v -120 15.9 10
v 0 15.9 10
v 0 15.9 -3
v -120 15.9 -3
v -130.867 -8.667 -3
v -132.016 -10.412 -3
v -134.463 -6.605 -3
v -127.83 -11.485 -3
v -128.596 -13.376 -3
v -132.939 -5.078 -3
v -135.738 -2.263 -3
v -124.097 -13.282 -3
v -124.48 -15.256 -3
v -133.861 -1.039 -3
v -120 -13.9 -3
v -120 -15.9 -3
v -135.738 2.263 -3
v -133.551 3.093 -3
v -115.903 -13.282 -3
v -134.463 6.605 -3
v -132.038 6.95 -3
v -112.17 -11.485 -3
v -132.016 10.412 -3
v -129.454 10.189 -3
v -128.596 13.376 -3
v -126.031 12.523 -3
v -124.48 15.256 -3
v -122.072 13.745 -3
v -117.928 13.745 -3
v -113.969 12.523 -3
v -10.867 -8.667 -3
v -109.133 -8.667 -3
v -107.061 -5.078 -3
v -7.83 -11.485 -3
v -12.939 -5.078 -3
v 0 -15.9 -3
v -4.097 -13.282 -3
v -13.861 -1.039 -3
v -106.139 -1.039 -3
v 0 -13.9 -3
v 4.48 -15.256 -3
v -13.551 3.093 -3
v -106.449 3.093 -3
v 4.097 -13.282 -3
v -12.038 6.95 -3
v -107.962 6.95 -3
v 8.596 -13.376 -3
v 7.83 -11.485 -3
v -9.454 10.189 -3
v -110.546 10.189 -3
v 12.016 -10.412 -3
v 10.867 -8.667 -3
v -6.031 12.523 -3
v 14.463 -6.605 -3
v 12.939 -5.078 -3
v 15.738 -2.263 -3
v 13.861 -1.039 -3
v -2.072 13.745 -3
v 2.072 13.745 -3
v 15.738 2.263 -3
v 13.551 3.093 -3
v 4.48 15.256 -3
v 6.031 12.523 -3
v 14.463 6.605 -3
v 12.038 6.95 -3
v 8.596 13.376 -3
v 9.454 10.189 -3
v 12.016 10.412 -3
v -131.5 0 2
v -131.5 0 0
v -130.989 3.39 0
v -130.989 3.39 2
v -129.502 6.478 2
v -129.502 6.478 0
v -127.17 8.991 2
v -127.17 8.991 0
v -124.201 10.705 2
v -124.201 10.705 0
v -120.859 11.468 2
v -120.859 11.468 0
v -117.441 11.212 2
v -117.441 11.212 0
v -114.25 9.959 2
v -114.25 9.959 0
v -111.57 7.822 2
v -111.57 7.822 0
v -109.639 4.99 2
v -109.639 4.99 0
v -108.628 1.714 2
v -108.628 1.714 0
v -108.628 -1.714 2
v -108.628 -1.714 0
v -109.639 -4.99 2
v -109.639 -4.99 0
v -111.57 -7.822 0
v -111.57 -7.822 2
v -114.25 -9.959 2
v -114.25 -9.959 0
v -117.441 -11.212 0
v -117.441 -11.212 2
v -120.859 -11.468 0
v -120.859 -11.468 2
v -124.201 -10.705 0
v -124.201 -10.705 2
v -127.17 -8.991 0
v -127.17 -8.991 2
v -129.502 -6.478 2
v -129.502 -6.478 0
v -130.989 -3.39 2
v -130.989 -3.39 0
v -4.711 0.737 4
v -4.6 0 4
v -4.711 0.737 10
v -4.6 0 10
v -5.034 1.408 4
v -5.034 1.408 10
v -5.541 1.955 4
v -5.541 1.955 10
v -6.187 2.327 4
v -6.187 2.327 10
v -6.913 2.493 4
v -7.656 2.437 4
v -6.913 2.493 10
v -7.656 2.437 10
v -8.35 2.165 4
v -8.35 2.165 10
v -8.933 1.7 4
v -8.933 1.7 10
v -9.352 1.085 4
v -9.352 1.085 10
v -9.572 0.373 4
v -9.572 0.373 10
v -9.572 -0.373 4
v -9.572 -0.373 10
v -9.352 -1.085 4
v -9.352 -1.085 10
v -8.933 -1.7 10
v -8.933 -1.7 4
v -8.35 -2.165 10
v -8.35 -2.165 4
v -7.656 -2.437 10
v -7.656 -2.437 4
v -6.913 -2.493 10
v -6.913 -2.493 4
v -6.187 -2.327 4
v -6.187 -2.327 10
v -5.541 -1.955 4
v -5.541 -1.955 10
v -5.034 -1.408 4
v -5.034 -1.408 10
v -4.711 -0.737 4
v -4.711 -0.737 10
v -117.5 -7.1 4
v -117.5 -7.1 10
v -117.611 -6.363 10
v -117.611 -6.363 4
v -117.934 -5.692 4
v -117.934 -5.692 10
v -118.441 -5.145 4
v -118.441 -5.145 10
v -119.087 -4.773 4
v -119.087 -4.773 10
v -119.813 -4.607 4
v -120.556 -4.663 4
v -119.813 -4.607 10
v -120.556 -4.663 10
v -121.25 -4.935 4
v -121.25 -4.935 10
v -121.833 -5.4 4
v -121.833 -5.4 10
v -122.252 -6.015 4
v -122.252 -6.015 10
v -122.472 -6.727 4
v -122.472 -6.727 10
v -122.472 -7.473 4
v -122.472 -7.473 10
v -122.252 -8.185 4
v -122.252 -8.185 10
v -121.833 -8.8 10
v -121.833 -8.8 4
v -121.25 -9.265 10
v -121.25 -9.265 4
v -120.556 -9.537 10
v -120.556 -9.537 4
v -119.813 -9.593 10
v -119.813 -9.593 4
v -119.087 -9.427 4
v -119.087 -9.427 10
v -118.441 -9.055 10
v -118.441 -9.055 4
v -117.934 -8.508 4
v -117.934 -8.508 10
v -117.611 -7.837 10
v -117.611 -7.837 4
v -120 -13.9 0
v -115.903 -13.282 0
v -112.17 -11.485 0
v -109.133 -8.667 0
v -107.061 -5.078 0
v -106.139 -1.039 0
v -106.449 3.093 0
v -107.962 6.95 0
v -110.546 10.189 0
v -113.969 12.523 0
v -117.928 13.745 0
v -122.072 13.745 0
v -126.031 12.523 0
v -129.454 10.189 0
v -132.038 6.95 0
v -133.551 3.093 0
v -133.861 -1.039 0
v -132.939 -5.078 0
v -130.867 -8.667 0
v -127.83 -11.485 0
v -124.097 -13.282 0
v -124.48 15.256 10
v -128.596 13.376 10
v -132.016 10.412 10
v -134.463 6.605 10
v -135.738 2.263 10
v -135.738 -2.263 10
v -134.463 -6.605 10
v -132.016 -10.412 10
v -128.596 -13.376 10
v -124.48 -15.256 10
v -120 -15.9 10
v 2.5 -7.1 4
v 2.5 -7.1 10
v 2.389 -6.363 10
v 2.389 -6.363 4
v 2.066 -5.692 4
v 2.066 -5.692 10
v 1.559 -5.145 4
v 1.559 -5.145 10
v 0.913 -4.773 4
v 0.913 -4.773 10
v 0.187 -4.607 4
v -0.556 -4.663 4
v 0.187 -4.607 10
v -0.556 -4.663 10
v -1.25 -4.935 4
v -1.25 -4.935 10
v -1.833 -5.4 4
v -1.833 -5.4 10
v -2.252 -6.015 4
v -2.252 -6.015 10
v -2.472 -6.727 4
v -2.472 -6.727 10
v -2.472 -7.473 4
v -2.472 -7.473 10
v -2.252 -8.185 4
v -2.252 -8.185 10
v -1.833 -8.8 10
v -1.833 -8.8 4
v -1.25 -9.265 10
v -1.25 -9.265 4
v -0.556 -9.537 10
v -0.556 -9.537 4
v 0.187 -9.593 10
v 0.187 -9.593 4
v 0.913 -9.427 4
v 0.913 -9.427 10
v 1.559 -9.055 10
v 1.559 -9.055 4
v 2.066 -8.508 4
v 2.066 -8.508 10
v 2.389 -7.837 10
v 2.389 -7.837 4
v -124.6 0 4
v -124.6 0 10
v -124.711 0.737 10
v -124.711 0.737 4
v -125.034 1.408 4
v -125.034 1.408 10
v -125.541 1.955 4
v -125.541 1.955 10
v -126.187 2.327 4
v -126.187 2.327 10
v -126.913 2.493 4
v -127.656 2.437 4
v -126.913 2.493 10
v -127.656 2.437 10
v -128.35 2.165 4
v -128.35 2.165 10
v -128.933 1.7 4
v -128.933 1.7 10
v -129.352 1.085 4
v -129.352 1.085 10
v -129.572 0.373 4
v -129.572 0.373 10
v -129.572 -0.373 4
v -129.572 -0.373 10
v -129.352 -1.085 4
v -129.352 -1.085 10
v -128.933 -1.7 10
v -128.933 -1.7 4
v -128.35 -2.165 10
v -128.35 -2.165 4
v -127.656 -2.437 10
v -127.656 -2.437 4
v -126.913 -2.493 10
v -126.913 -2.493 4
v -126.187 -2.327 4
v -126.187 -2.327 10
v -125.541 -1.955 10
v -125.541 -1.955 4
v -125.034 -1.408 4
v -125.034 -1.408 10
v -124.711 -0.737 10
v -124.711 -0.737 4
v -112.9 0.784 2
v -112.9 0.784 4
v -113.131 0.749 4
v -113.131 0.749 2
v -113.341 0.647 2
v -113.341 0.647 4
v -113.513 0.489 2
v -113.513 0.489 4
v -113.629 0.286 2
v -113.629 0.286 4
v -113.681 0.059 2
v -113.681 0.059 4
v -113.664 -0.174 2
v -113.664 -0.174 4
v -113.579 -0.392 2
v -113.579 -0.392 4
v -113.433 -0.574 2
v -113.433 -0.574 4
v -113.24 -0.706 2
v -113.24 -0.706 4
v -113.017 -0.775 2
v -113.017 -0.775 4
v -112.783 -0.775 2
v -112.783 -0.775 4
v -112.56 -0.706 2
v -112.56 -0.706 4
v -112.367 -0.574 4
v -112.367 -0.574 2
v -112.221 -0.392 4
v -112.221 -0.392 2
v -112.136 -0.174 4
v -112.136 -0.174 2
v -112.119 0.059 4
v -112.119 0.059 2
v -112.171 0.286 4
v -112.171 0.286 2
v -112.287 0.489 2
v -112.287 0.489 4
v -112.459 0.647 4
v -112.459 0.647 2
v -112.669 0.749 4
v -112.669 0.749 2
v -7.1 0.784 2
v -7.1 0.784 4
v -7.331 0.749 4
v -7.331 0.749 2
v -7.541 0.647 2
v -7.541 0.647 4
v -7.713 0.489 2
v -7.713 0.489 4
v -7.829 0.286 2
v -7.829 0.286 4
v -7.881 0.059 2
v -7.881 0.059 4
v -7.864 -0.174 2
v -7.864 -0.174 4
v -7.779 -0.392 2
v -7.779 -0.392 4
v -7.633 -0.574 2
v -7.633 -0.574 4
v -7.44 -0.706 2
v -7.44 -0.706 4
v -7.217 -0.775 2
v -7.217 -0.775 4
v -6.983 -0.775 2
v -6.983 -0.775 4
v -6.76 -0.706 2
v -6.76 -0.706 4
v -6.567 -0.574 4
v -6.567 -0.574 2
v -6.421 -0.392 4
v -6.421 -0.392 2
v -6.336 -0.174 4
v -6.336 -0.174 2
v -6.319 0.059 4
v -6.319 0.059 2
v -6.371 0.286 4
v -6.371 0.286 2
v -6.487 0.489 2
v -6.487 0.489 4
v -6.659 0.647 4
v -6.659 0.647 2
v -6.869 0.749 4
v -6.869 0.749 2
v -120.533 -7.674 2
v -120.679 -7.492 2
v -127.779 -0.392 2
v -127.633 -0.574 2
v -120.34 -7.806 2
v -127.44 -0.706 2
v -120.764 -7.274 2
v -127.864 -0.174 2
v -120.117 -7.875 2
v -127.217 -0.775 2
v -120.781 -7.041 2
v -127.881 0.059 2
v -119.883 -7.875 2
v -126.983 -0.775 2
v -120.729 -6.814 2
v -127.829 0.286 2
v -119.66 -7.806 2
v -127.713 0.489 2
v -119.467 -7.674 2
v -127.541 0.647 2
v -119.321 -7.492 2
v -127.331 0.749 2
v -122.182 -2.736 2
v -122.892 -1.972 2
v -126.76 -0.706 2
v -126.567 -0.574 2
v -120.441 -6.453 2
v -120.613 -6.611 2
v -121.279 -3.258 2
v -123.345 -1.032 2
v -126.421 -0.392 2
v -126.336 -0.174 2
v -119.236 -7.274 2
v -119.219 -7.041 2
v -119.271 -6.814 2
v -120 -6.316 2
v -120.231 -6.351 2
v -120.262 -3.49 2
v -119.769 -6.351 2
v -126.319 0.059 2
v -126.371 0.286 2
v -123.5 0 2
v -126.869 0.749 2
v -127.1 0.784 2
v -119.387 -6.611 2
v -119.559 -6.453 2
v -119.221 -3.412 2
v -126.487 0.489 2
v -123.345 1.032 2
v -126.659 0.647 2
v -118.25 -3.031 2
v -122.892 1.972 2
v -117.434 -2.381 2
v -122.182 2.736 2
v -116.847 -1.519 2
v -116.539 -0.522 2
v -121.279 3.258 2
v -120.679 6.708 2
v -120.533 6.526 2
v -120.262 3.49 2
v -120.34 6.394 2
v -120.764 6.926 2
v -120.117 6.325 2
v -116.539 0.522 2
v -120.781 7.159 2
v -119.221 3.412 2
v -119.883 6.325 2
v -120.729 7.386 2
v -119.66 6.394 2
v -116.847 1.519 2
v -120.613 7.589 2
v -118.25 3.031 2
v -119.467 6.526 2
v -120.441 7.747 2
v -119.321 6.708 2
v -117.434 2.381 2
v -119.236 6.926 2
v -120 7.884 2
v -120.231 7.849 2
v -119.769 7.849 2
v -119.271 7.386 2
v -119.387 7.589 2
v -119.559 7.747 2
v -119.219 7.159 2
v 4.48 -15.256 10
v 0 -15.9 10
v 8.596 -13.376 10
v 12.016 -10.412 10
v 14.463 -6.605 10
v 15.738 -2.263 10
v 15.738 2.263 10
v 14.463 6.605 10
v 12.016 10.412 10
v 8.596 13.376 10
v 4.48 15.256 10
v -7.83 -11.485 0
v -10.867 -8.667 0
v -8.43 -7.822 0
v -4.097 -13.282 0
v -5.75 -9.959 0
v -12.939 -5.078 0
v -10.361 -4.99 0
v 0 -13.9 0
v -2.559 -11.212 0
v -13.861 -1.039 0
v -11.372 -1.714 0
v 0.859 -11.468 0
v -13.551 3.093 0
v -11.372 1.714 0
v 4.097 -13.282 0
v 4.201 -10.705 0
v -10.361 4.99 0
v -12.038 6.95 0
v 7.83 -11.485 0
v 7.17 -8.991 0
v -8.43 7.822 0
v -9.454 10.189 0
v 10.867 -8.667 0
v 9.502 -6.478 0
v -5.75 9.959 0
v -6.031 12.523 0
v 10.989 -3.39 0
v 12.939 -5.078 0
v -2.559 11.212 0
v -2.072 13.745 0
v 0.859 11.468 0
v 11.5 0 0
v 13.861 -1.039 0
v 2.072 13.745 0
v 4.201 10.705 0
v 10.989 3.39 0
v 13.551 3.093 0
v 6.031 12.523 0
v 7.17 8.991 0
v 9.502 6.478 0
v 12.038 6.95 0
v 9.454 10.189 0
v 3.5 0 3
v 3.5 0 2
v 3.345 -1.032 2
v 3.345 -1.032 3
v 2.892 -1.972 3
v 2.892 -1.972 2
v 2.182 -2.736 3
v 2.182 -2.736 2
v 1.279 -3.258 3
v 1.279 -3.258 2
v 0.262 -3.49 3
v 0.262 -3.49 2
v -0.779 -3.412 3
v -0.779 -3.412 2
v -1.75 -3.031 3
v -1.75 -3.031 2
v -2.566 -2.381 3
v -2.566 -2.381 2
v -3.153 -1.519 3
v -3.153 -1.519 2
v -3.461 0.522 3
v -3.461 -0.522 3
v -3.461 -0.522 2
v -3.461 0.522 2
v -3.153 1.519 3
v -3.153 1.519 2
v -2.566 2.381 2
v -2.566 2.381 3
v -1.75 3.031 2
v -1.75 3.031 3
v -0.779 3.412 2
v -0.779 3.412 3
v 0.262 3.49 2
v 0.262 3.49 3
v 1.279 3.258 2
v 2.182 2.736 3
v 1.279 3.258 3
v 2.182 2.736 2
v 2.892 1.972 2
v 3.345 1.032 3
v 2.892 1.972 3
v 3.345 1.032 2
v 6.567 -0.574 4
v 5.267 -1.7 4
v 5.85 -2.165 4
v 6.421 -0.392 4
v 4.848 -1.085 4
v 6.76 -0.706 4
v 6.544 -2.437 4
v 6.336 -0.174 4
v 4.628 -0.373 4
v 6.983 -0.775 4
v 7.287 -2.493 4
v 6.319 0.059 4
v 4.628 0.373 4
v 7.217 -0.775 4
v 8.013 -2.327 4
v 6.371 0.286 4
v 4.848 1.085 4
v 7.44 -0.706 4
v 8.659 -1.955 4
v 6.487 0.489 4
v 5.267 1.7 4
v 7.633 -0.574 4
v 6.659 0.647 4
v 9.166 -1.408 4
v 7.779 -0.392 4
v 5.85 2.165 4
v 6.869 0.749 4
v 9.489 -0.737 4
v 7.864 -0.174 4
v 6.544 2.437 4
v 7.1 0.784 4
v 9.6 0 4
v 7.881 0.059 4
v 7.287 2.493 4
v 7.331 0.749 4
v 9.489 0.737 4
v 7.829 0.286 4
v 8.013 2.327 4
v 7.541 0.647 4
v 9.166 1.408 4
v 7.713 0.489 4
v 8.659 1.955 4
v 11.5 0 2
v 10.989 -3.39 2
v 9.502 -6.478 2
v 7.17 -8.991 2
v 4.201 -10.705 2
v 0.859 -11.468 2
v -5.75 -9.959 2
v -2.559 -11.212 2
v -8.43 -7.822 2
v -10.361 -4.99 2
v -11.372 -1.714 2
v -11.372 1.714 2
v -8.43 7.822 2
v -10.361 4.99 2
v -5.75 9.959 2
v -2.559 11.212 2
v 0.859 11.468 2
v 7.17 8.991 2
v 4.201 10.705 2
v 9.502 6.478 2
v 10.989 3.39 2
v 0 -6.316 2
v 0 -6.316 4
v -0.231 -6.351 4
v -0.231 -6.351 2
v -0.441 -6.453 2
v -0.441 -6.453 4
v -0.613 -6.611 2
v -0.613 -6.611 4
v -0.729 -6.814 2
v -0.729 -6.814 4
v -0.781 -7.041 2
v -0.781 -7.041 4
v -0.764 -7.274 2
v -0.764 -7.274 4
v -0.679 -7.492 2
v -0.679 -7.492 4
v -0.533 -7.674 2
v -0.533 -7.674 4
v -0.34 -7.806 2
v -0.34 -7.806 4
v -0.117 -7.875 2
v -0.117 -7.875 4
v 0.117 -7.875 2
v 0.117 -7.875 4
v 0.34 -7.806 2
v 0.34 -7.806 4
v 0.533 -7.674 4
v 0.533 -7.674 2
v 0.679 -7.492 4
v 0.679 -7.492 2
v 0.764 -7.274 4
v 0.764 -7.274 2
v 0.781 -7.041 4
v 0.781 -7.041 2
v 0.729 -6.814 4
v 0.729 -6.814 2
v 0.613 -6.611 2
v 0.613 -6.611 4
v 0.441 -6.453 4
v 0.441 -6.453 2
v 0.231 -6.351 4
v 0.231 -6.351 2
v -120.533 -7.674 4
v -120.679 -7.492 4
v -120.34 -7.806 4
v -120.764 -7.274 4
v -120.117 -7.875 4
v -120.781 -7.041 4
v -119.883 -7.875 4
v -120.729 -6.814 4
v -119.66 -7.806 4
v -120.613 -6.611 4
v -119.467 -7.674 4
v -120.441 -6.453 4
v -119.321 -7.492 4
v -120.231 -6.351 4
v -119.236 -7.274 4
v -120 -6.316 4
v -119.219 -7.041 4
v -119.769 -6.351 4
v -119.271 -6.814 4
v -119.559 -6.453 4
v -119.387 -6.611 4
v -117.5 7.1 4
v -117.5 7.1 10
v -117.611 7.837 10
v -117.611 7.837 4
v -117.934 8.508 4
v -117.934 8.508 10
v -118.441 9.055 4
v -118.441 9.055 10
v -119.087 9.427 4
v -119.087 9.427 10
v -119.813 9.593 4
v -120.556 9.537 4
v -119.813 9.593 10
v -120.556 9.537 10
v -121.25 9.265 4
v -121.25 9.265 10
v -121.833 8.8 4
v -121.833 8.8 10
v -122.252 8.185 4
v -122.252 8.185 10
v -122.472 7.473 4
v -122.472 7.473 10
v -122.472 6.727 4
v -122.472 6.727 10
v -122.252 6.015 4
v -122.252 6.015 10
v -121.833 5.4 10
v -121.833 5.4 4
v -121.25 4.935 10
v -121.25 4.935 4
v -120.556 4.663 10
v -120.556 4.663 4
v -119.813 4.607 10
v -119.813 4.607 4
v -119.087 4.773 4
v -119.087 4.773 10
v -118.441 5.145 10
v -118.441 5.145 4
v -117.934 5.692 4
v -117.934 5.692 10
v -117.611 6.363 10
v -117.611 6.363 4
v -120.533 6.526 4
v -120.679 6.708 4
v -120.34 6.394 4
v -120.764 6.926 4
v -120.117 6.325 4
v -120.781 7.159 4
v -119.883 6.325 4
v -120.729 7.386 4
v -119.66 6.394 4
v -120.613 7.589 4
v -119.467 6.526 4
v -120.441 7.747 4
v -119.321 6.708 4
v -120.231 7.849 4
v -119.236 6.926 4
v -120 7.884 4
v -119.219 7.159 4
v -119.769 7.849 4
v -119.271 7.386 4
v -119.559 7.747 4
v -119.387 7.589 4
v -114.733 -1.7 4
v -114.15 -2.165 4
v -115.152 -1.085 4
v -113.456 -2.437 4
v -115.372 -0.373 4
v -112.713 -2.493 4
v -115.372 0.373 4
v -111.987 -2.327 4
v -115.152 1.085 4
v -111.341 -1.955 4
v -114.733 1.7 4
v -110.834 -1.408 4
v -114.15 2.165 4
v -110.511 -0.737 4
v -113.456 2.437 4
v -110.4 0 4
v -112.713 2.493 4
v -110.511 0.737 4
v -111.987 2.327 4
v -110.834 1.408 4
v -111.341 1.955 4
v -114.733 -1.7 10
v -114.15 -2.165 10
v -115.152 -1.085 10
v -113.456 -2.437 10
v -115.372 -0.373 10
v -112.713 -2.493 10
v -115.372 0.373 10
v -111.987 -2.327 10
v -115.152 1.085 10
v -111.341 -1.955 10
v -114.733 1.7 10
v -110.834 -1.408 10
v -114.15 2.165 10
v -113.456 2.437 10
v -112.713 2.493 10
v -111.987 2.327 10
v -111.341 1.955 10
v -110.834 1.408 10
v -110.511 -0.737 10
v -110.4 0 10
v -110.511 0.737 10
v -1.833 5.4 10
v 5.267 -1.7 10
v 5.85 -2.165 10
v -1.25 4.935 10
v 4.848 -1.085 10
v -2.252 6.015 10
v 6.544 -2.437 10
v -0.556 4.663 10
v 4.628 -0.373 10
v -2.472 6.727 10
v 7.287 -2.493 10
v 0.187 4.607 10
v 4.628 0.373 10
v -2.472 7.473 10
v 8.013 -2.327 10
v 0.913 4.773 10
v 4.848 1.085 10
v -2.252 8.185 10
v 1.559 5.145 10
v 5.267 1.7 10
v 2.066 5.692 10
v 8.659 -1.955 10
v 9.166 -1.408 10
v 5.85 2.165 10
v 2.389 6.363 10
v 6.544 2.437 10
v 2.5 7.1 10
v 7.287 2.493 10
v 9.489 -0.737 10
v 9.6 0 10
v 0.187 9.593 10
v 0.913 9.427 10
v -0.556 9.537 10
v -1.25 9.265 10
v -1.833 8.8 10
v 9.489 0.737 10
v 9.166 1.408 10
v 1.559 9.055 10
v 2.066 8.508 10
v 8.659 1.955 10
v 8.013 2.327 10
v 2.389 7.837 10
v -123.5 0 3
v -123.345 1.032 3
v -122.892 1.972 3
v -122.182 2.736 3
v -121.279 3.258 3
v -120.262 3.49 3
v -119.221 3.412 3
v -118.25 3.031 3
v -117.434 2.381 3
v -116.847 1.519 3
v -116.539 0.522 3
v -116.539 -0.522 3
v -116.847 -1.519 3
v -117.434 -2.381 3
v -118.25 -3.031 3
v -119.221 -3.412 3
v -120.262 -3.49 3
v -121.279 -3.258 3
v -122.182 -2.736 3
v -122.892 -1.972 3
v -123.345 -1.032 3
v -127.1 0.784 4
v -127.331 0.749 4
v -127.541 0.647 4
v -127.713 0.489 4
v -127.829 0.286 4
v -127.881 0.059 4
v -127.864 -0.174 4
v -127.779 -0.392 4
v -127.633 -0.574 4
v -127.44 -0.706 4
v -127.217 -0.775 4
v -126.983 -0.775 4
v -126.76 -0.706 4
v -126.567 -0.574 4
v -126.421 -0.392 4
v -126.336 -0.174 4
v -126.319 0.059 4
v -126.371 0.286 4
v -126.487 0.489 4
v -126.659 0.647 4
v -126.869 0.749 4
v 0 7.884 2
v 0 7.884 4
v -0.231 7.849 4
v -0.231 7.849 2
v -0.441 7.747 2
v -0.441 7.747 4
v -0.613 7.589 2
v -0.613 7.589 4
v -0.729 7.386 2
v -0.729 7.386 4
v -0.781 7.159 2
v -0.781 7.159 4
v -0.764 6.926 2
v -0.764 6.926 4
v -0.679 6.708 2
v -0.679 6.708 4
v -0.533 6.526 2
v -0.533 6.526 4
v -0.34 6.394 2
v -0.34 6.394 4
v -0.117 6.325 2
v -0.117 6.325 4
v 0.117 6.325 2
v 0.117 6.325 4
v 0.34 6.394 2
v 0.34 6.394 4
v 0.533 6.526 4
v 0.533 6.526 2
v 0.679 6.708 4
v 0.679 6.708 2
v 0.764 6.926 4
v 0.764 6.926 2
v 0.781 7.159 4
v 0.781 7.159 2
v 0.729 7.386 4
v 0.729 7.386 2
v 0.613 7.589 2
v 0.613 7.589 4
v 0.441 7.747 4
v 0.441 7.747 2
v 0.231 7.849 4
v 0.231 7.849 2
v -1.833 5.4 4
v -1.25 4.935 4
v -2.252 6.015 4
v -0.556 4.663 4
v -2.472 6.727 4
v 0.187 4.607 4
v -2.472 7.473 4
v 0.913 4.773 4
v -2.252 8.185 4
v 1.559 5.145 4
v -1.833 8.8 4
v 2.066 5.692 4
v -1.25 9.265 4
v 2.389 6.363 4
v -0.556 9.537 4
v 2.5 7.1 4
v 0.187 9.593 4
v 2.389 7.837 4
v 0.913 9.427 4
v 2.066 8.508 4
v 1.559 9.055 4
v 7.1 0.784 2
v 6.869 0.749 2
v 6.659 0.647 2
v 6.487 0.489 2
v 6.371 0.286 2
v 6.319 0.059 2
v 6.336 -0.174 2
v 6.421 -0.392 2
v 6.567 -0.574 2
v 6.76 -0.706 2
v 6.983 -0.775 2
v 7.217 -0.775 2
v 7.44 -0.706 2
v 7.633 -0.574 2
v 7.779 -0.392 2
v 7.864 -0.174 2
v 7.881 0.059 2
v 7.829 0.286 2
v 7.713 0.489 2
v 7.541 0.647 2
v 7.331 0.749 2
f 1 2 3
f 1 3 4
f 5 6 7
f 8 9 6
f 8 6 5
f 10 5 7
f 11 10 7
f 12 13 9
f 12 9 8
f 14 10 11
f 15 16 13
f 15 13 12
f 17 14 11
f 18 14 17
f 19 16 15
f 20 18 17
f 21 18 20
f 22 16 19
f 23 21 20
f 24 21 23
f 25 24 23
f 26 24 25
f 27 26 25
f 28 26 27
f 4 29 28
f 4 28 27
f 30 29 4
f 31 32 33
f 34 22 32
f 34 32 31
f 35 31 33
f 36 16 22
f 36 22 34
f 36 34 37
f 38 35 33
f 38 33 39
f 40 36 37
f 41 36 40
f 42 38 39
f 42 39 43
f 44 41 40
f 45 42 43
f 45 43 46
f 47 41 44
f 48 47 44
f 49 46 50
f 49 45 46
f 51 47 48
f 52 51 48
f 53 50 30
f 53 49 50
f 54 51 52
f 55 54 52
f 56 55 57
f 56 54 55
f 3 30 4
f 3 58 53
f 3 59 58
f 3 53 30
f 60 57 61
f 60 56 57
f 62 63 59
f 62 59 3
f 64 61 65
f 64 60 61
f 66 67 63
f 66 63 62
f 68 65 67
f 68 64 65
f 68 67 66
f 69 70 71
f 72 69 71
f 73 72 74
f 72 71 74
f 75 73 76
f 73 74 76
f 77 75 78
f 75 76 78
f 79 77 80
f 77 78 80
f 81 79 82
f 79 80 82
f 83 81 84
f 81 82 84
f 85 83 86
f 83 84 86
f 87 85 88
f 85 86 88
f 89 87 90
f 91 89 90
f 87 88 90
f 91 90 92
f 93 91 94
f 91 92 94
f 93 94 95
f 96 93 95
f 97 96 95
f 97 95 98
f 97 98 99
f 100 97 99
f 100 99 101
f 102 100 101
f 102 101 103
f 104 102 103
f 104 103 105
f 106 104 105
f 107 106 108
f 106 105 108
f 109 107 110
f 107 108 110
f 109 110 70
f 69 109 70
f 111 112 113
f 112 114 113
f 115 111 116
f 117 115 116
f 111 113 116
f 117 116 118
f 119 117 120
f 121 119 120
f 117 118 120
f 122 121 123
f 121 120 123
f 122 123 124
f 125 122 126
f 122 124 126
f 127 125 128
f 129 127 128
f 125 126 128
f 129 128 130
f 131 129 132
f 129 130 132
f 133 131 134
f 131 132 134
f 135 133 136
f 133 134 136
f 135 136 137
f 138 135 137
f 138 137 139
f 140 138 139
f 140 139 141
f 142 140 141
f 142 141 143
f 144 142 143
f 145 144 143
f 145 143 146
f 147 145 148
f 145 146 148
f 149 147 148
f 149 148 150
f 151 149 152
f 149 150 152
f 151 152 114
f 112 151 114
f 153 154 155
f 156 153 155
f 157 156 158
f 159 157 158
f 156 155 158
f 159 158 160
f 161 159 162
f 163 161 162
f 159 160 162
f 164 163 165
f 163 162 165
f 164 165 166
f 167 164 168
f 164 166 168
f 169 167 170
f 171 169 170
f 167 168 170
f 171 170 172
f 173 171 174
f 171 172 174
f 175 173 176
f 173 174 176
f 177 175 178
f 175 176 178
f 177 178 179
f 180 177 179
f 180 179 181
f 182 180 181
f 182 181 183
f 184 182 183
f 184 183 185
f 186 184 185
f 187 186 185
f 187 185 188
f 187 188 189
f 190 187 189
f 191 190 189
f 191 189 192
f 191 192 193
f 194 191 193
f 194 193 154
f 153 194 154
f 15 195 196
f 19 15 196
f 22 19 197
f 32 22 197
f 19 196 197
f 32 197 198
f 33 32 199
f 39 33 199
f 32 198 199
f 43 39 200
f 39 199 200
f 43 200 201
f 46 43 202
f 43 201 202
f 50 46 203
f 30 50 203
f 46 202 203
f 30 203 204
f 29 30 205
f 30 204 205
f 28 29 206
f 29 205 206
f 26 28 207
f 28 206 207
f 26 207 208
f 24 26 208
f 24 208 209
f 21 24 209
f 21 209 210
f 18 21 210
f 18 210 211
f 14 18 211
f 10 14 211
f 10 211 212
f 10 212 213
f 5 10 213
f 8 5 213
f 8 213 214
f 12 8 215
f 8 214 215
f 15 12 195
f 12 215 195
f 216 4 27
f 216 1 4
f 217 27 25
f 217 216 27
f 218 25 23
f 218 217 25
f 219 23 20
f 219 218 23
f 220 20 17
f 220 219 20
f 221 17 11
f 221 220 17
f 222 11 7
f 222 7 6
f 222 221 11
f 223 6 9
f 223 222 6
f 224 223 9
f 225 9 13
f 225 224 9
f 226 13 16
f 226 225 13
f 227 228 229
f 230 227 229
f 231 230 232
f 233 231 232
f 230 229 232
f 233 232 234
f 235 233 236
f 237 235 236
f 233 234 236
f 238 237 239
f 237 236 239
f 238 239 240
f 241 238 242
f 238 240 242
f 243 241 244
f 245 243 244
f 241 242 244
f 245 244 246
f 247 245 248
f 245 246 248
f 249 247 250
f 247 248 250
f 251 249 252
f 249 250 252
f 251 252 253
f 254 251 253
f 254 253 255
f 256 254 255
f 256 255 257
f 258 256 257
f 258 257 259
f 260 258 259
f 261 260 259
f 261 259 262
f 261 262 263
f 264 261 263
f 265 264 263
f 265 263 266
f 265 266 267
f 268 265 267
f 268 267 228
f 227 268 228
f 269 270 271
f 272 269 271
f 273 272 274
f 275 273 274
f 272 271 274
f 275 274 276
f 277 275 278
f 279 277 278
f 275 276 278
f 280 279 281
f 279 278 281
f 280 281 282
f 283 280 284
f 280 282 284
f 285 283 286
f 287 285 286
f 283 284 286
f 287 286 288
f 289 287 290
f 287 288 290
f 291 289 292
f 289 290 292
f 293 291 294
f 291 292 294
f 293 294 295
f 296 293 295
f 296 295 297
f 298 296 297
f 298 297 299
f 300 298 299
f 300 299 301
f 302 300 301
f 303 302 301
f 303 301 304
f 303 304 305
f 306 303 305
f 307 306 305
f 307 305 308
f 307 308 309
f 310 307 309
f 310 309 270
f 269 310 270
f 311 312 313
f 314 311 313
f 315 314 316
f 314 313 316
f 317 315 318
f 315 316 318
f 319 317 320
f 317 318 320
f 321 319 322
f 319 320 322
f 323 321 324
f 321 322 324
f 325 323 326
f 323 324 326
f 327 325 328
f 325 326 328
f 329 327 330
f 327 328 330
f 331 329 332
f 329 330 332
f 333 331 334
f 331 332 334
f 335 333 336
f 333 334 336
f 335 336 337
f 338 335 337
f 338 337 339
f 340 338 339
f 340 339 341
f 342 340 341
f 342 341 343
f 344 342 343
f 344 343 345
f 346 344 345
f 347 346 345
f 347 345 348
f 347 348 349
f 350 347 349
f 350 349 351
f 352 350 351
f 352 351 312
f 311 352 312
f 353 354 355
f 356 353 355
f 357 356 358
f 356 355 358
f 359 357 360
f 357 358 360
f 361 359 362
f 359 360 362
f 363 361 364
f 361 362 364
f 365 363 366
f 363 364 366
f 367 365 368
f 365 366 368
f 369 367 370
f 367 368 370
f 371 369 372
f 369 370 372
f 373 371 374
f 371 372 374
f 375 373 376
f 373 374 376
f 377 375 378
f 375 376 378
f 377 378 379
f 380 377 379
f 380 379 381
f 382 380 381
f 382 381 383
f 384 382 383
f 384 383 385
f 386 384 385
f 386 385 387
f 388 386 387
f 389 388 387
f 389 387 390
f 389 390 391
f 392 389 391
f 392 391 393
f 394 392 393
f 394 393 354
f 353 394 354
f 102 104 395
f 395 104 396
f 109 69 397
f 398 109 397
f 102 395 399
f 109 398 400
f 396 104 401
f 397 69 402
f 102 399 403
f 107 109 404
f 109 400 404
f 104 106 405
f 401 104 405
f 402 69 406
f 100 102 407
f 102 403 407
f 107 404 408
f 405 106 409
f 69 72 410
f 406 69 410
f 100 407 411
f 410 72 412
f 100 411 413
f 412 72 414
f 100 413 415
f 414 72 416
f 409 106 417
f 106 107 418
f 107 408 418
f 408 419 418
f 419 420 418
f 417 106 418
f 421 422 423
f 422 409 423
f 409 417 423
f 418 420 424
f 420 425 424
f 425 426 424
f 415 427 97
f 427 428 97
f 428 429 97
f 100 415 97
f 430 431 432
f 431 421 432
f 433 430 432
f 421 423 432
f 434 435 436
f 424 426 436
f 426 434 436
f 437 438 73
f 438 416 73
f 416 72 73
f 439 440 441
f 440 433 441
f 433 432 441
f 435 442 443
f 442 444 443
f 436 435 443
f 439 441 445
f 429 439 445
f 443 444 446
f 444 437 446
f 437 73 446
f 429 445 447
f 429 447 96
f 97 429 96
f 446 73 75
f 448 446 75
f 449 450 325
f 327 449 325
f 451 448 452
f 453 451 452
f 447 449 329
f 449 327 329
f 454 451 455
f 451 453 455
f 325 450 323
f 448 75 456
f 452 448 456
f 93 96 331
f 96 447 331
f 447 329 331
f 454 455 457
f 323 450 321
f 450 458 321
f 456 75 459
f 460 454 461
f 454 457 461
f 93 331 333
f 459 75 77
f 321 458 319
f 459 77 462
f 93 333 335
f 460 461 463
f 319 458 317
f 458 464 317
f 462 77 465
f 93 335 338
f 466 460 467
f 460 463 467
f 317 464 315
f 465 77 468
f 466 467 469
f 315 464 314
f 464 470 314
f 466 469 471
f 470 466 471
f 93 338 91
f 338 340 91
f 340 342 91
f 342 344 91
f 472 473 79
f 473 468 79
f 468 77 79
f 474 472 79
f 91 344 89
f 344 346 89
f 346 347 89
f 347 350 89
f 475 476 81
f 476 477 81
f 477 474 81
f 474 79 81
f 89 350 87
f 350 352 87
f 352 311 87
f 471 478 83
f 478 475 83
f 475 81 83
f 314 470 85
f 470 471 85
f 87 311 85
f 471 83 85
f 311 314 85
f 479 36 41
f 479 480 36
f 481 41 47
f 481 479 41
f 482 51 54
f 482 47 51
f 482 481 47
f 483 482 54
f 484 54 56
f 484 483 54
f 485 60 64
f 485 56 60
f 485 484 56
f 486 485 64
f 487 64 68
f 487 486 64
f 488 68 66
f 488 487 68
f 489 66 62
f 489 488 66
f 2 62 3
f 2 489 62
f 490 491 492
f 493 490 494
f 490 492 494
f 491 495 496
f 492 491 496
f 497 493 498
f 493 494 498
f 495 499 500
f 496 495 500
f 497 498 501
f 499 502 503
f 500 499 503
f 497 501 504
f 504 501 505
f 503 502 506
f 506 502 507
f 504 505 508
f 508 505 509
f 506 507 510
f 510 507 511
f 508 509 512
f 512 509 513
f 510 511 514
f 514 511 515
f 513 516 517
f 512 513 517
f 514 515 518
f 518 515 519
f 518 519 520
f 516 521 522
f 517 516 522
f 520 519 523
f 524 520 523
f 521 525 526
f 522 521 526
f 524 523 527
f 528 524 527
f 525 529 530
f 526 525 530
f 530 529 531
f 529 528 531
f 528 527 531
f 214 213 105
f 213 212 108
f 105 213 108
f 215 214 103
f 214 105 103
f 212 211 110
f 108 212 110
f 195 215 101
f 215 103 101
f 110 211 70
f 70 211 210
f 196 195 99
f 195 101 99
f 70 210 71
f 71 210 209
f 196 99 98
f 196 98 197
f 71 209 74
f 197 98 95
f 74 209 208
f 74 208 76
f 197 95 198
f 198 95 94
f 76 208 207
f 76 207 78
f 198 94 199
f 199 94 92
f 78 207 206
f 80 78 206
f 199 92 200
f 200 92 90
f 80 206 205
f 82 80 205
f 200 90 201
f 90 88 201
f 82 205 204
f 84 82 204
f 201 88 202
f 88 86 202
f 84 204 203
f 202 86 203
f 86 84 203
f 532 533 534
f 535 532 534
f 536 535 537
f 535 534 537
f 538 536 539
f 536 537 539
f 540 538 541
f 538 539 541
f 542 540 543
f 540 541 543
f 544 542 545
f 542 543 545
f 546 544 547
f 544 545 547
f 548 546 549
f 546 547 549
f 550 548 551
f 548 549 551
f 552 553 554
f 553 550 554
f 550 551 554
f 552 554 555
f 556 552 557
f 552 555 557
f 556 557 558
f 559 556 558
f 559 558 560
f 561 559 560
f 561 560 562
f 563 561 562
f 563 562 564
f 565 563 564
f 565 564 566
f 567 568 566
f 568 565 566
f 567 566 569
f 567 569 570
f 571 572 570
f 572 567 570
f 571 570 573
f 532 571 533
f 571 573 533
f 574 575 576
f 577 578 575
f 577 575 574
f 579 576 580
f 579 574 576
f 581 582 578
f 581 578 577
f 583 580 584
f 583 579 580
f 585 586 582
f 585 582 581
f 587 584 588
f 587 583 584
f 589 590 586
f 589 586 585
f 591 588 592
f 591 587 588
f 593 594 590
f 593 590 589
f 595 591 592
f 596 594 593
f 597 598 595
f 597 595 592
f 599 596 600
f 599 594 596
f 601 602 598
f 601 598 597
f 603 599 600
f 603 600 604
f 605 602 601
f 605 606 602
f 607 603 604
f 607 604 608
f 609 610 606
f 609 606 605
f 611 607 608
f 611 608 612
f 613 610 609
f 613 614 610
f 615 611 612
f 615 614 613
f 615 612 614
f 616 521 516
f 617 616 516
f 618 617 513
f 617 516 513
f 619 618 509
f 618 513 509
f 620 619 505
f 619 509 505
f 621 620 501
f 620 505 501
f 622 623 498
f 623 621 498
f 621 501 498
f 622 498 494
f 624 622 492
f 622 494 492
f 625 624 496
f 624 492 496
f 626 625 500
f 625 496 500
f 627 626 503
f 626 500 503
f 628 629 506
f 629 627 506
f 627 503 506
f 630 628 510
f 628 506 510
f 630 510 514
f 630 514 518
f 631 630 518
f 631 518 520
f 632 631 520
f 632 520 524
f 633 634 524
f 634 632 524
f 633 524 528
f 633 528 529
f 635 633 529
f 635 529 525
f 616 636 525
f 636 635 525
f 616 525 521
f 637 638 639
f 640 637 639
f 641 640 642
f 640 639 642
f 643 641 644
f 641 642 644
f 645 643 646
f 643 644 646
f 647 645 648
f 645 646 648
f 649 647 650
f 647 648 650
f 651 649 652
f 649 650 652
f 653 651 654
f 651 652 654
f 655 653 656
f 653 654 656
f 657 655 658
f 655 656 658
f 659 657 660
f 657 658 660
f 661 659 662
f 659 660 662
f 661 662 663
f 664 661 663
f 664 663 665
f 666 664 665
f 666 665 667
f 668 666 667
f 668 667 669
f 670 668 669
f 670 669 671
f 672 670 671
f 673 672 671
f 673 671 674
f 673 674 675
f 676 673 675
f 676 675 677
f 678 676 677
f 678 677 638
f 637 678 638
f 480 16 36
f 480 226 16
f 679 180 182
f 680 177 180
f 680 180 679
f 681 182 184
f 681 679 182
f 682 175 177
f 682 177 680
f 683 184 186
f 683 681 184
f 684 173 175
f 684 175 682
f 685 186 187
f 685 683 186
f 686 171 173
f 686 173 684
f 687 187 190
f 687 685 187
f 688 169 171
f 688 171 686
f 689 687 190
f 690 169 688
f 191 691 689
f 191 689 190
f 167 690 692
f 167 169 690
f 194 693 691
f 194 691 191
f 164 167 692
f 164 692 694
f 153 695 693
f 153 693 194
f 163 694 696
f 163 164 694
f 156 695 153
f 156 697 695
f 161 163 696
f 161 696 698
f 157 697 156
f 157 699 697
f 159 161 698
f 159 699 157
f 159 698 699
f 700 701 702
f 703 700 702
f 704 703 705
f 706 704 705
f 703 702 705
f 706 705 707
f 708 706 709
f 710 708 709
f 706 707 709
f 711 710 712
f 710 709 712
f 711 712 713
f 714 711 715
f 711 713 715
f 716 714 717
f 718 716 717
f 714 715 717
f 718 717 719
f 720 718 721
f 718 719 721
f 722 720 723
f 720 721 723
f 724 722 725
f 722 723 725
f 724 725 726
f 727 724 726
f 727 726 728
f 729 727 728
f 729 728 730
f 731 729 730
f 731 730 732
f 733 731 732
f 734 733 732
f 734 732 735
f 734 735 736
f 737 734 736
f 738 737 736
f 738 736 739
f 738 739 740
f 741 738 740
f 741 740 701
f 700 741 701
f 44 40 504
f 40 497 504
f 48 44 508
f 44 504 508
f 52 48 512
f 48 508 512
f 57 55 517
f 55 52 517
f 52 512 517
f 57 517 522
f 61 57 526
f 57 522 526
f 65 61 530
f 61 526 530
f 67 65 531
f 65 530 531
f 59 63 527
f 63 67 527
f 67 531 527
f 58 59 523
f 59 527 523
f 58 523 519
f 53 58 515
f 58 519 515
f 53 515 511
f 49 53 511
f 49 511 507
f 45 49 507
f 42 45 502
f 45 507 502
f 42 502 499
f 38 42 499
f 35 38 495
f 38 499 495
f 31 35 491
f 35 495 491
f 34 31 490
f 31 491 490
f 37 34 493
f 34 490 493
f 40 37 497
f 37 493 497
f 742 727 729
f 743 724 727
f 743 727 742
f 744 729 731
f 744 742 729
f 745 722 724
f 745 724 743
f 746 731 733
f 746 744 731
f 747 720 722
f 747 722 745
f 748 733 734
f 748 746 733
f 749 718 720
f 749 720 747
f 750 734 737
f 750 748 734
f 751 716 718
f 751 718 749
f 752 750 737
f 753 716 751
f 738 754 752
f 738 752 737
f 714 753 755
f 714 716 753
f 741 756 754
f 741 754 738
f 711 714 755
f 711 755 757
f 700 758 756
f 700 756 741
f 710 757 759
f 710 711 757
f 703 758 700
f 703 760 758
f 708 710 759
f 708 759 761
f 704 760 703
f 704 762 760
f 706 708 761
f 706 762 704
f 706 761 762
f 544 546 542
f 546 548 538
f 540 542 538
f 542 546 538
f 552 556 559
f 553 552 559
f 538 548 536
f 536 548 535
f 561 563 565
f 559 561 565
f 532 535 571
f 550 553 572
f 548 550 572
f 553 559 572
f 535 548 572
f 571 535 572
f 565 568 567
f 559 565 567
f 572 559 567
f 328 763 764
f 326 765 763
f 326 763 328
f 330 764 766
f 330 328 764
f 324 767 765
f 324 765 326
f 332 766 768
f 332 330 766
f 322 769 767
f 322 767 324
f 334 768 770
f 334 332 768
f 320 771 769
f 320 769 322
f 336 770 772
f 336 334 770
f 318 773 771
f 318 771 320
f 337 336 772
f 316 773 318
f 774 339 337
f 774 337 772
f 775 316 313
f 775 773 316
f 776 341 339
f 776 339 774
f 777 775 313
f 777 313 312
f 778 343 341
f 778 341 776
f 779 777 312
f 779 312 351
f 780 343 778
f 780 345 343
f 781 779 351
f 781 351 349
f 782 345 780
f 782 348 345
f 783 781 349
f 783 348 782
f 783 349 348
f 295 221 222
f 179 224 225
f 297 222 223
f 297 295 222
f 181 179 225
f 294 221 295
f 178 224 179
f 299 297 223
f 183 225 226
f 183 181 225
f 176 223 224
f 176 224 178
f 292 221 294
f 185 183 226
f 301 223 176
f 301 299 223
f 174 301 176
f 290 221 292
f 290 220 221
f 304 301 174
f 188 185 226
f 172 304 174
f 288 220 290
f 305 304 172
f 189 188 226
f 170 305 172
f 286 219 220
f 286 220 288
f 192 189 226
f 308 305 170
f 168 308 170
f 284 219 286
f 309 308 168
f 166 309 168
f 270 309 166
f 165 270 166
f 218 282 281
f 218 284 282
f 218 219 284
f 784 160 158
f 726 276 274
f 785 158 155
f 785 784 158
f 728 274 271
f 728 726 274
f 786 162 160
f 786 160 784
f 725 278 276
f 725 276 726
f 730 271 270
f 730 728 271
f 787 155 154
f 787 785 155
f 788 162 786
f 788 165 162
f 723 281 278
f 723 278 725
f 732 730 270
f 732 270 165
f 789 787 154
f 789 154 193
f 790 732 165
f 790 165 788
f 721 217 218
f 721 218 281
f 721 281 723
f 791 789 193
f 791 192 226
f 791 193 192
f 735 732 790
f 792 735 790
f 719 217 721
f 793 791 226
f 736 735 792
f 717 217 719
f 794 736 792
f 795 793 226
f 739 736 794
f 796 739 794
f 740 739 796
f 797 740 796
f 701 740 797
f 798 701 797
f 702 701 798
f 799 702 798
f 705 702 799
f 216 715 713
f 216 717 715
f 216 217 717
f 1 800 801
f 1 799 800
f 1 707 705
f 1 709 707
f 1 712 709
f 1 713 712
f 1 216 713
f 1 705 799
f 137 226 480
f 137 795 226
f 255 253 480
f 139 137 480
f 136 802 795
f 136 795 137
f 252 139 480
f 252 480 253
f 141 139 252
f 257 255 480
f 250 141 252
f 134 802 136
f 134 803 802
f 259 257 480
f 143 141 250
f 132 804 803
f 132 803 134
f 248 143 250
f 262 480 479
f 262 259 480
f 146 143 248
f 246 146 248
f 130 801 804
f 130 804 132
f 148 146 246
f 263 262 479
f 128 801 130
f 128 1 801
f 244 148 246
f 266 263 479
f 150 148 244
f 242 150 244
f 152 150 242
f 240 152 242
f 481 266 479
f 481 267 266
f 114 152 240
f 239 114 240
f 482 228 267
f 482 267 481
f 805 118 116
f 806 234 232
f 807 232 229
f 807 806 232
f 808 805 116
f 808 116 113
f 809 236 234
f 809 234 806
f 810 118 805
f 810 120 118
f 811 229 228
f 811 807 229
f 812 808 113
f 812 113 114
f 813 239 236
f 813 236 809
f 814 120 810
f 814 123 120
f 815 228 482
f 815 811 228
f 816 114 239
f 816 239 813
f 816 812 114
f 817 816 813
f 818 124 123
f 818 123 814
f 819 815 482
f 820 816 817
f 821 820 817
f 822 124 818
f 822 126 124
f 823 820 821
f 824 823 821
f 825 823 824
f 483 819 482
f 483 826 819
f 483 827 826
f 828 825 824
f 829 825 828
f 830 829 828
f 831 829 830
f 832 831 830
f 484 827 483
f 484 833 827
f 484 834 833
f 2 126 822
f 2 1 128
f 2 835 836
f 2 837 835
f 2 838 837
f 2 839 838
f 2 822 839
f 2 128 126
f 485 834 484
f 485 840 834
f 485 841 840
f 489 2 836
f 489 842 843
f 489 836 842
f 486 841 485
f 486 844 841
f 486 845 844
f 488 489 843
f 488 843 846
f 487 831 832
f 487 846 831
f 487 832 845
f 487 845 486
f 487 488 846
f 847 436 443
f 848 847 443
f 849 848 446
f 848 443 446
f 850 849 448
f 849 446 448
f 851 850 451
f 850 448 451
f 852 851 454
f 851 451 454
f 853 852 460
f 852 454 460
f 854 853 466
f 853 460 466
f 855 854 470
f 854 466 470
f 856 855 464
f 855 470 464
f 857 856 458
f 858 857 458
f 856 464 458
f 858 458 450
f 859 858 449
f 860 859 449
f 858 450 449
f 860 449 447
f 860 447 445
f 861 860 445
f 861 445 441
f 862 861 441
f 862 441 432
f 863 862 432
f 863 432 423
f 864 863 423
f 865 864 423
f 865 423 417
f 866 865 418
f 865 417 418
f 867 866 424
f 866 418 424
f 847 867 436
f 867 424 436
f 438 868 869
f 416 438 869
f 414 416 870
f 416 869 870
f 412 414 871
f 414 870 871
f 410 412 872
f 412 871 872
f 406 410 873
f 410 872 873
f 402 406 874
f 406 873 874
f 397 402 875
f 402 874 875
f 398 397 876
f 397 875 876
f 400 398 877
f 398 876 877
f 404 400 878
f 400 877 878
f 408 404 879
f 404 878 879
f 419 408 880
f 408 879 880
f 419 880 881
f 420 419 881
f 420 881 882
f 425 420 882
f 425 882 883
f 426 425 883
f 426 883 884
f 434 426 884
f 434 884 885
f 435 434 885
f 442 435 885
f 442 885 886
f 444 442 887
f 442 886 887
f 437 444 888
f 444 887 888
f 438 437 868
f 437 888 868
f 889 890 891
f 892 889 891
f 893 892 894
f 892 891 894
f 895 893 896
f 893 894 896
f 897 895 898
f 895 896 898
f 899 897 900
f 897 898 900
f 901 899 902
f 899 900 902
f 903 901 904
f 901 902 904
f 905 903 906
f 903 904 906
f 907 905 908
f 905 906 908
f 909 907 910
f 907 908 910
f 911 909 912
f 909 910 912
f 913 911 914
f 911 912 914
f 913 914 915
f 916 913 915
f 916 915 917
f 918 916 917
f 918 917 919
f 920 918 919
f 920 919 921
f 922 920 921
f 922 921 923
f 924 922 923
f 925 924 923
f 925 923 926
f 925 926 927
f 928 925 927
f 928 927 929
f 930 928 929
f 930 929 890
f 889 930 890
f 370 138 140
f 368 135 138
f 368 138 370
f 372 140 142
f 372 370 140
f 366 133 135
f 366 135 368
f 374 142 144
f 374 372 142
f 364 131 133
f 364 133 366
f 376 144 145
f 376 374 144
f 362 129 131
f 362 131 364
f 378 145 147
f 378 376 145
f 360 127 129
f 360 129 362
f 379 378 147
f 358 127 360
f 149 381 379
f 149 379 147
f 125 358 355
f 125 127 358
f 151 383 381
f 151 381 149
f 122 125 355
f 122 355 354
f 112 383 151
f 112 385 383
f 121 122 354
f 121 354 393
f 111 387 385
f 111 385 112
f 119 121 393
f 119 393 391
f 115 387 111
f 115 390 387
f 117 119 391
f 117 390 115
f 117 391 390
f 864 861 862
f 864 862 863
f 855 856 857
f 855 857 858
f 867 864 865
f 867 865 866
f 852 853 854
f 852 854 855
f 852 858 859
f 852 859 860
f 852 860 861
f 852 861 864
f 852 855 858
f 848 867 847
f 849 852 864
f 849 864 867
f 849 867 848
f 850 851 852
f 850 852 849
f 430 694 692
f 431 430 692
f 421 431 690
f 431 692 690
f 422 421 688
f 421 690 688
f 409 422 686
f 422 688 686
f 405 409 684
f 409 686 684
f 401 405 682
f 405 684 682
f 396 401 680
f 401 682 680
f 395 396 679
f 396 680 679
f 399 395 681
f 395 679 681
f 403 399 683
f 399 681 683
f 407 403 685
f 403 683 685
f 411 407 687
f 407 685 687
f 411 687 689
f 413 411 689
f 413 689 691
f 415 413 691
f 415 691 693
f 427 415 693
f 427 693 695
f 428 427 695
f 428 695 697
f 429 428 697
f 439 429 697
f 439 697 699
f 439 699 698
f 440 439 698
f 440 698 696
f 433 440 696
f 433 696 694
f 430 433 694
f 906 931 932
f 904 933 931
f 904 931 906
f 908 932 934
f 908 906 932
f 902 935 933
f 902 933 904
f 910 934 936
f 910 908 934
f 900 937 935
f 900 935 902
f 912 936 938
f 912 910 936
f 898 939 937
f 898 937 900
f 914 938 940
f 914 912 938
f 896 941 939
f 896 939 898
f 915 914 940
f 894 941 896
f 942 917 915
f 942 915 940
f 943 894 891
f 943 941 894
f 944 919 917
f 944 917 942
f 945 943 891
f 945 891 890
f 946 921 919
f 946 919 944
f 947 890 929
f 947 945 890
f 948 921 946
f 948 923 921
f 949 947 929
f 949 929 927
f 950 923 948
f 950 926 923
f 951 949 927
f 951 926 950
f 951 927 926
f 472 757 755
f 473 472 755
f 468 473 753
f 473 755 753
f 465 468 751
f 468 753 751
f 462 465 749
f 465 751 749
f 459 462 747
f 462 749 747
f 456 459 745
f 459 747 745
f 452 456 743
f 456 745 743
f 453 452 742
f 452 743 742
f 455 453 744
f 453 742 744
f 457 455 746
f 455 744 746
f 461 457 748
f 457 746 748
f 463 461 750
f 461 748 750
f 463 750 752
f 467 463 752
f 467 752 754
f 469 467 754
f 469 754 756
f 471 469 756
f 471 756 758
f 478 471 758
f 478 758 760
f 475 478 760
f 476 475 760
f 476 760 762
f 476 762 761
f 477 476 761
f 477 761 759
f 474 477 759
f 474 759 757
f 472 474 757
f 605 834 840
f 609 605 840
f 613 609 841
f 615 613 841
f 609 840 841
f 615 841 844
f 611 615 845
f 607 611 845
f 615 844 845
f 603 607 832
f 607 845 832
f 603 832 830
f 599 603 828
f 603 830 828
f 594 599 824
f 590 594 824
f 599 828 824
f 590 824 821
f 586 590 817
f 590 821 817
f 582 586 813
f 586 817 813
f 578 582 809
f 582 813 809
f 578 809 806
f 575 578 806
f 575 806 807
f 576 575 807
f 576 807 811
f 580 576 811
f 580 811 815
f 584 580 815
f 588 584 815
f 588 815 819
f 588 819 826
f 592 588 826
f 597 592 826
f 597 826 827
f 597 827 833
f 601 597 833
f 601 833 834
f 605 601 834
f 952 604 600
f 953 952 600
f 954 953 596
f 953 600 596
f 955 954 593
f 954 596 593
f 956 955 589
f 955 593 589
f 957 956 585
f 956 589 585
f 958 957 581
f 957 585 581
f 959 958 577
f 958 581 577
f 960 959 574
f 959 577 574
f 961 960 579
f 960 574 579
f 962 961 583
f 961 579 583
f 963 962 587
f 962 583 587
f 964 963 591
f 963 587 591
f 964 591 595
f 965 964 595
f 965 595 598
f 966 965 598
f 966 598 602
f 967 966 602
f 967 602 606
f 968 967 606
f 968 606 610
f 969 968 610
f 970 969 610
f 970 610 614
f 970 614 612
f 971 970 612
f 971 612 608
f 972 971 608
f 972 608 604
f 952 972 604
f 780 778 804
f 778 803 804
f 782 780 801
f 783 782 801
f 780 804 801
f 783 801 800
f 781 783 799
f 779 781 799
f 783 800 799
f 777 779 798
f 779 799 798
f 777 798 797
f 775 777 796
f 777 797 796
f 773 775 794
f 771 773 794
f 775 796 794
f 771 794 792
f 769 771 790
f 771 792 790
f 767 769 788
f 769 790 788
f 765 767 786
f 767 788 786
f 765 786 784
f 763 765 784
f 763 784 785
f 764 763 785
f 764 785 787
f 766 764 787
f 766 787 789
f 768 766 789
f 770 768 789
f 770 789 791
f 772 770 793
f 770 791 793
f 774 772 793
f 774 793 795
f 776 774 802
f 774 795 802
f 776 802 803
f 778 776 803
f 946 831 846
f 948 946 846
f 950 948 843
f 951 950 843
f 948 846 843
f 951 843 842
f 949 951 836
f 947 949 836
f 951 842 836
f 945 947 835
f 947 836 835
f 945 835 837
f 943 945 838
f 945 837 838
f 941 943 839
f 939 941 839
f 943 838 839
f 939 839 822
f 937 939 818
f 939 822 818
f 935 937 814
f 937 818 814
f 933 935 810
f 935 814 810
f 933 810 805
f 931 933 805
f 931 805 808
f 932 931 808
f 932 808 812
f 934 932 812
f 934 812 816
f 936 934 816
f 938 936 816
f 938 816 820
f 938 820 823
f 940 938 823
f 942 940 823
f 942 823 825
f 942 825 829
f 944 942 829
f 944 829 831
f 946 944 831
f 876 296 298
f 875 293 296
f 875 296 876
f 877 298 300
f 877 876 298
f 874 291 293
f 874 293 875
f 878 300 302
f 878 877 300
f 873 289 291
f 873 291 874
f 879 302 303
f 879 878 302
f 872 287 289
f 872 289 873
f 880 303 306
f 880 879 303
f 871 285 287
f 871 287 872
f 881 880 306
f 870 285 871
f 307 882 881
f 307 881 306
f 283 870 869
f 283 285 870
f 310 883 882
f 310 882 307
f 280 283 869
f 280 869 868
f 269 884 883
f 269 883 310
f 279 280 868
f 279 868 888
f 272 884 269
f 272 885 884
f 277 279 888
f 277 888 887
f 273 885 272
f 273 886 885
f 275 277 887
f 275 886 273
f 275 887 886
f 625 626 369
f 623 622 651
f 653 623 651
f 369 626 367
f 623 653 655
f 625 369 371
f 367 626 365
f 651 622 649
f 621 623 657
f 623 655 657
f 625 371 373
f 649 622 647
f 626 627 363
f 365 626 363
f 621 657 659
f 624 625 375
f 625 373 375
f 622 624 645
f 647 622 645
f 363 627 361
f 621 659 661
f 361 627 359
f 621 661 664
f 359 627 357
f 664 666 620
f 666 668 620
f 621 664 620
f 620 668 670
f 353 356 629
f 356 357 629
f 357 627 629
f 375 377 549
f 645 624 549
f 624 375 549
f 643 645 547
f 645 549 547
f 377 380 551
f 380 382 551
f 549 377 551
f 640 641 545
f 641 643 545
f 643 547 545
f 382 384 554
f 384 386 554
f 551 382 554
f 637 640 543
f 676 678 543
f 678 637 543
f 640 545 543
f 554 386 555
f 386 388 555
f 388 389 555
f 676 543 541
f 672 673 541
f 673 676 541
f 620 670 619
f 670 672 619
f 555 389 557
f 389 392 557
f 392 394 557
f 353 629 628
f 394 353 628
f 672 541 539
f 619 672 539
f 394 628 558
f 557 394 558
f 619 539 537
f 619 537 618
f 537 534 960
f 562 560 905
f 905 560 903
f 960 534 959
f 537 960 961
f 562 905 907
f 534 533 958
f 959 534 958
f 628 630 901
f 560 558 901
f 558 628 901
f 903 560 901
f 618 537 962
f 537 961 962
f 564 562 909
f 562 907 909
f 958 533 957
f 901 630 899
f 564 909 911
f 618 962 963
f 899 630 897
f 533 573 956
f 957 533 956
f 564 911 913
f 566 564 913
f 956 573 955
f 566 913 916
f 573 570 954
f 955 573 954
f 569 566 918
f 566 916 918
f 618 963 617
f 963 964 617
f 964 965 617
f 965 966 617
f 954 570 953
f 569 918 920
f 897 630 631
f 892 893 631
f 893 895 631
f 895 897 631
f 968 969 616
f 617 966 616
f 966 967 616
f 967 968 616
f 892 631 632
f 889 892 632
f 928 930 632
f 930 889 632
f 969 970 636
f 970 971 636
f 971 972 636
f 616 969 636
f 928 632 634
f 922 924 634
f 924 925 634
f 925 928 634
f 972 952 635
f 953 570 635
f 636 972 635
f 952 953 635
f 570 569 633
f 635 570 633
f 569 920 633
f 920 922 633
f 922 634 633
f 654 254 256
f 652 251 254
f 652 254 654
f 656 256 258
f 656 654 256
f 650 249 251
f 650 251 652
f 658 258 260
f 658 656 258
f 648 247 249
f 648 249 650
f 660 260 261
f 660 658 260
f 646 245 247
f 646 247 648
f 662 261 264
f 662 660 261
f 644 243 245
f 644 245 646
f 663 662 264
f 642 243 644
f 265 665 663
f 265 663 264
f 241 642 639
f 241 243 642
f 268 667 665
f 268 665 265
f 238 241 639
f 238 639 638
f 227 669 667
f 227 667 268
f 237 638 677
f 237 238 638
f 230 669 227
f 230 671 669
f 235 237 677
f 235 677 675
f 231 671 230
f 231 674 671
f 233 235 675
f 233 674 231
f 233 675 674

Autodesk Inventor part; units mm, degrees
ref_plane "YZ Plane" through (0, 0, 0) normal (1, 0, 0) x (0, 1, 0)
ref_plane "XZ Plane" through (0, 0, 0) normal (0, 1, 0) x (-1, 0, 0)
sketch "Szkic1" plane through (0, 0, 0) normal (0, 0, 1) x (1, 0, 0)
  circle A0 centre (0, 0) radius 3.5
  circle A1 centre (0, 0) radius 15.9
  circle A2 centre (0, 0) radius 11.5
  line L0 (0, -15.9) -> (-60, -15.9)
  line L1 (0, 15.9) -> (-60, 15.9)
  line L2 (-60, 15.9) -> (-60, -15.9)
  point P0 (0, 7.1)
  point P1 (-7.1, 0)
  point P2 (7.1, 0)
  point P3 (0, -7.1)
  dimension "d0" = 7
  dimension "d1" = 7.1
  dimension "d2" = 7.1
  dimension "d3" = 7.1
  dimension "d4" = 7.1
  dimension "d5" = 31.8
  dimension "d6" = 23
  dimension "d23" = 60
extrude "Wyciągnięcie proste1" add sketch "Szkic1" along normal blind 10 contours A0 | A1 | A1 L0 L2 L1 | A2
extrude "Wyciągnięcie proste2" cut sketch "Szkic1" along normal blind 2 contours A2
extrude "Wyciągnięcie proste3" cut sketch "Szkic1" along normal blind 3 contours A0
hole "Otwór1" at (0, 7.1, 0) at (-7.1, 0, 0) at (7.1, 0, 0) at (0, -7.1, 0) direction (0, 0, 1) diameter 1.567 end through all thread size "M2x0.4" designation "M2" class "6H" standard "GB Metric profile"
sketch "Szkic2" plane through (0, 0, 0) normal (0, 0, -1) x (0, -1, 0)
  arc A0 (-15.9, 0) -> (15.9, 0) centre (0, 0) ccw projected
  circle A1 centre (0, 0) radius 11.5 projected
  circle A2 centre (0, 0) radius 13.9
  line L0 (15.9, 60) -> (15.9, 0) projected
  line L1 (-15.9, 60) -> (15.9, 60) projected
  line L2 (-15.9, 0) -> (-15.9, 60) projected
  dimension "d20" = 2
extrude "Wyciągnięcie proste4" add sketch "Szkic2" along normal blind 3 contours L2 L1 L0 A0
ref_plane "Płaszczyzna konstrukcyjna2" through (-60, 15.9, 10) normal (1, 0, 0) x (0, -1, 0)
mirror "Odbij1" about plane through (-60, 15.9, 0) normal (-1, 0, 0) of "Wyciągnięcie proste4", "Otwór1", "Wyciągnięcie proste1", "Wyciągnięcie proste2"
sketch "Szkic4" plane through (-120, 0, 0) normal (0, 0, -1) x (-1, 0, 0)
  circle A0 centre (0, 0) radius 3.5 projected
  point P0 (-120, 0)
extrude "Wyciągnięcie proste5" cut sketch "Szkic4" against normal blind 3
sketch "Szkic5" plane through (0, 0, 10) normal (0, 0, 1) x (1, 0, 0)
  circle A0 centre (-127.1, 0) radius 0.7835 projected
  circle A1 centre (-120, -7.1) radius 0.7835 projected
  circle A2 centre (-112.9, 0) radius 0.7835 projected
  circle A3 centre (-120, 7.1) radius 0.7835 projected
  circle A4 centre (7.1, 0) radius 0.7835 projected
  circle A5 centre (0, 7.1) radius 0.7835 projected
  circle A6 centre (-7.1, 0) radius 0.7835 projected
  circle A7 centre (0, -7.1) radius 0.7835 projected
  arc A8 (0, -15.9) -> (0, 15.9) centre (0, 0) ccw projected
  line L0 (0, 15.9) -> (-120, 15.9) projected
  arc A9 (-120, 15.9) -> (-120, -15.9) centre (-120, 0) ccw projected
  line L1 (0, -15.9) -> (-120, -15.9) projected
  circle A10 centre (0, 7.1) radius 2.5
  circle A11 centre (7.1, 0) radius 2.5
  circle A12 centre (0, -7.1) radius 2.5
  circle A13 centre (-7.1, 0) radius 2.5
  circle A14 centre (-120, 7.1) radius 2.5
  circle A15 centre (-112.9, 0) radius 2.5
  circle A16 centre (-120, -7.1) radius 2.5
  circle A17 centre (-127.1, 0) radius 2.5
  dimension "d27" = 5
  dimension "d28" = 5
  dimension "d29" = 5
  dimension "d30" = 5
  dimension "d31" = 5
  dimension "d32" = 5
  dimension "d33" = 5
  dimension "d34" = 5
extrude "Wyciągnięcie proste6" cut sketch "Szkic5" against normal blind 6 contours A0 | A1 | A2 | A3 | A4 | A5 | A6 | A7 | A10 | A11 | A12 | A13 | A14 | A15 | A16 | A17
equation "\"d2\" = d1"
equation "\"d3\" = d2"
equation "\"d4\" = d1"
equation "\"d18\" = d1"
properties part number "Ramie2_Drukowanie 3D"
